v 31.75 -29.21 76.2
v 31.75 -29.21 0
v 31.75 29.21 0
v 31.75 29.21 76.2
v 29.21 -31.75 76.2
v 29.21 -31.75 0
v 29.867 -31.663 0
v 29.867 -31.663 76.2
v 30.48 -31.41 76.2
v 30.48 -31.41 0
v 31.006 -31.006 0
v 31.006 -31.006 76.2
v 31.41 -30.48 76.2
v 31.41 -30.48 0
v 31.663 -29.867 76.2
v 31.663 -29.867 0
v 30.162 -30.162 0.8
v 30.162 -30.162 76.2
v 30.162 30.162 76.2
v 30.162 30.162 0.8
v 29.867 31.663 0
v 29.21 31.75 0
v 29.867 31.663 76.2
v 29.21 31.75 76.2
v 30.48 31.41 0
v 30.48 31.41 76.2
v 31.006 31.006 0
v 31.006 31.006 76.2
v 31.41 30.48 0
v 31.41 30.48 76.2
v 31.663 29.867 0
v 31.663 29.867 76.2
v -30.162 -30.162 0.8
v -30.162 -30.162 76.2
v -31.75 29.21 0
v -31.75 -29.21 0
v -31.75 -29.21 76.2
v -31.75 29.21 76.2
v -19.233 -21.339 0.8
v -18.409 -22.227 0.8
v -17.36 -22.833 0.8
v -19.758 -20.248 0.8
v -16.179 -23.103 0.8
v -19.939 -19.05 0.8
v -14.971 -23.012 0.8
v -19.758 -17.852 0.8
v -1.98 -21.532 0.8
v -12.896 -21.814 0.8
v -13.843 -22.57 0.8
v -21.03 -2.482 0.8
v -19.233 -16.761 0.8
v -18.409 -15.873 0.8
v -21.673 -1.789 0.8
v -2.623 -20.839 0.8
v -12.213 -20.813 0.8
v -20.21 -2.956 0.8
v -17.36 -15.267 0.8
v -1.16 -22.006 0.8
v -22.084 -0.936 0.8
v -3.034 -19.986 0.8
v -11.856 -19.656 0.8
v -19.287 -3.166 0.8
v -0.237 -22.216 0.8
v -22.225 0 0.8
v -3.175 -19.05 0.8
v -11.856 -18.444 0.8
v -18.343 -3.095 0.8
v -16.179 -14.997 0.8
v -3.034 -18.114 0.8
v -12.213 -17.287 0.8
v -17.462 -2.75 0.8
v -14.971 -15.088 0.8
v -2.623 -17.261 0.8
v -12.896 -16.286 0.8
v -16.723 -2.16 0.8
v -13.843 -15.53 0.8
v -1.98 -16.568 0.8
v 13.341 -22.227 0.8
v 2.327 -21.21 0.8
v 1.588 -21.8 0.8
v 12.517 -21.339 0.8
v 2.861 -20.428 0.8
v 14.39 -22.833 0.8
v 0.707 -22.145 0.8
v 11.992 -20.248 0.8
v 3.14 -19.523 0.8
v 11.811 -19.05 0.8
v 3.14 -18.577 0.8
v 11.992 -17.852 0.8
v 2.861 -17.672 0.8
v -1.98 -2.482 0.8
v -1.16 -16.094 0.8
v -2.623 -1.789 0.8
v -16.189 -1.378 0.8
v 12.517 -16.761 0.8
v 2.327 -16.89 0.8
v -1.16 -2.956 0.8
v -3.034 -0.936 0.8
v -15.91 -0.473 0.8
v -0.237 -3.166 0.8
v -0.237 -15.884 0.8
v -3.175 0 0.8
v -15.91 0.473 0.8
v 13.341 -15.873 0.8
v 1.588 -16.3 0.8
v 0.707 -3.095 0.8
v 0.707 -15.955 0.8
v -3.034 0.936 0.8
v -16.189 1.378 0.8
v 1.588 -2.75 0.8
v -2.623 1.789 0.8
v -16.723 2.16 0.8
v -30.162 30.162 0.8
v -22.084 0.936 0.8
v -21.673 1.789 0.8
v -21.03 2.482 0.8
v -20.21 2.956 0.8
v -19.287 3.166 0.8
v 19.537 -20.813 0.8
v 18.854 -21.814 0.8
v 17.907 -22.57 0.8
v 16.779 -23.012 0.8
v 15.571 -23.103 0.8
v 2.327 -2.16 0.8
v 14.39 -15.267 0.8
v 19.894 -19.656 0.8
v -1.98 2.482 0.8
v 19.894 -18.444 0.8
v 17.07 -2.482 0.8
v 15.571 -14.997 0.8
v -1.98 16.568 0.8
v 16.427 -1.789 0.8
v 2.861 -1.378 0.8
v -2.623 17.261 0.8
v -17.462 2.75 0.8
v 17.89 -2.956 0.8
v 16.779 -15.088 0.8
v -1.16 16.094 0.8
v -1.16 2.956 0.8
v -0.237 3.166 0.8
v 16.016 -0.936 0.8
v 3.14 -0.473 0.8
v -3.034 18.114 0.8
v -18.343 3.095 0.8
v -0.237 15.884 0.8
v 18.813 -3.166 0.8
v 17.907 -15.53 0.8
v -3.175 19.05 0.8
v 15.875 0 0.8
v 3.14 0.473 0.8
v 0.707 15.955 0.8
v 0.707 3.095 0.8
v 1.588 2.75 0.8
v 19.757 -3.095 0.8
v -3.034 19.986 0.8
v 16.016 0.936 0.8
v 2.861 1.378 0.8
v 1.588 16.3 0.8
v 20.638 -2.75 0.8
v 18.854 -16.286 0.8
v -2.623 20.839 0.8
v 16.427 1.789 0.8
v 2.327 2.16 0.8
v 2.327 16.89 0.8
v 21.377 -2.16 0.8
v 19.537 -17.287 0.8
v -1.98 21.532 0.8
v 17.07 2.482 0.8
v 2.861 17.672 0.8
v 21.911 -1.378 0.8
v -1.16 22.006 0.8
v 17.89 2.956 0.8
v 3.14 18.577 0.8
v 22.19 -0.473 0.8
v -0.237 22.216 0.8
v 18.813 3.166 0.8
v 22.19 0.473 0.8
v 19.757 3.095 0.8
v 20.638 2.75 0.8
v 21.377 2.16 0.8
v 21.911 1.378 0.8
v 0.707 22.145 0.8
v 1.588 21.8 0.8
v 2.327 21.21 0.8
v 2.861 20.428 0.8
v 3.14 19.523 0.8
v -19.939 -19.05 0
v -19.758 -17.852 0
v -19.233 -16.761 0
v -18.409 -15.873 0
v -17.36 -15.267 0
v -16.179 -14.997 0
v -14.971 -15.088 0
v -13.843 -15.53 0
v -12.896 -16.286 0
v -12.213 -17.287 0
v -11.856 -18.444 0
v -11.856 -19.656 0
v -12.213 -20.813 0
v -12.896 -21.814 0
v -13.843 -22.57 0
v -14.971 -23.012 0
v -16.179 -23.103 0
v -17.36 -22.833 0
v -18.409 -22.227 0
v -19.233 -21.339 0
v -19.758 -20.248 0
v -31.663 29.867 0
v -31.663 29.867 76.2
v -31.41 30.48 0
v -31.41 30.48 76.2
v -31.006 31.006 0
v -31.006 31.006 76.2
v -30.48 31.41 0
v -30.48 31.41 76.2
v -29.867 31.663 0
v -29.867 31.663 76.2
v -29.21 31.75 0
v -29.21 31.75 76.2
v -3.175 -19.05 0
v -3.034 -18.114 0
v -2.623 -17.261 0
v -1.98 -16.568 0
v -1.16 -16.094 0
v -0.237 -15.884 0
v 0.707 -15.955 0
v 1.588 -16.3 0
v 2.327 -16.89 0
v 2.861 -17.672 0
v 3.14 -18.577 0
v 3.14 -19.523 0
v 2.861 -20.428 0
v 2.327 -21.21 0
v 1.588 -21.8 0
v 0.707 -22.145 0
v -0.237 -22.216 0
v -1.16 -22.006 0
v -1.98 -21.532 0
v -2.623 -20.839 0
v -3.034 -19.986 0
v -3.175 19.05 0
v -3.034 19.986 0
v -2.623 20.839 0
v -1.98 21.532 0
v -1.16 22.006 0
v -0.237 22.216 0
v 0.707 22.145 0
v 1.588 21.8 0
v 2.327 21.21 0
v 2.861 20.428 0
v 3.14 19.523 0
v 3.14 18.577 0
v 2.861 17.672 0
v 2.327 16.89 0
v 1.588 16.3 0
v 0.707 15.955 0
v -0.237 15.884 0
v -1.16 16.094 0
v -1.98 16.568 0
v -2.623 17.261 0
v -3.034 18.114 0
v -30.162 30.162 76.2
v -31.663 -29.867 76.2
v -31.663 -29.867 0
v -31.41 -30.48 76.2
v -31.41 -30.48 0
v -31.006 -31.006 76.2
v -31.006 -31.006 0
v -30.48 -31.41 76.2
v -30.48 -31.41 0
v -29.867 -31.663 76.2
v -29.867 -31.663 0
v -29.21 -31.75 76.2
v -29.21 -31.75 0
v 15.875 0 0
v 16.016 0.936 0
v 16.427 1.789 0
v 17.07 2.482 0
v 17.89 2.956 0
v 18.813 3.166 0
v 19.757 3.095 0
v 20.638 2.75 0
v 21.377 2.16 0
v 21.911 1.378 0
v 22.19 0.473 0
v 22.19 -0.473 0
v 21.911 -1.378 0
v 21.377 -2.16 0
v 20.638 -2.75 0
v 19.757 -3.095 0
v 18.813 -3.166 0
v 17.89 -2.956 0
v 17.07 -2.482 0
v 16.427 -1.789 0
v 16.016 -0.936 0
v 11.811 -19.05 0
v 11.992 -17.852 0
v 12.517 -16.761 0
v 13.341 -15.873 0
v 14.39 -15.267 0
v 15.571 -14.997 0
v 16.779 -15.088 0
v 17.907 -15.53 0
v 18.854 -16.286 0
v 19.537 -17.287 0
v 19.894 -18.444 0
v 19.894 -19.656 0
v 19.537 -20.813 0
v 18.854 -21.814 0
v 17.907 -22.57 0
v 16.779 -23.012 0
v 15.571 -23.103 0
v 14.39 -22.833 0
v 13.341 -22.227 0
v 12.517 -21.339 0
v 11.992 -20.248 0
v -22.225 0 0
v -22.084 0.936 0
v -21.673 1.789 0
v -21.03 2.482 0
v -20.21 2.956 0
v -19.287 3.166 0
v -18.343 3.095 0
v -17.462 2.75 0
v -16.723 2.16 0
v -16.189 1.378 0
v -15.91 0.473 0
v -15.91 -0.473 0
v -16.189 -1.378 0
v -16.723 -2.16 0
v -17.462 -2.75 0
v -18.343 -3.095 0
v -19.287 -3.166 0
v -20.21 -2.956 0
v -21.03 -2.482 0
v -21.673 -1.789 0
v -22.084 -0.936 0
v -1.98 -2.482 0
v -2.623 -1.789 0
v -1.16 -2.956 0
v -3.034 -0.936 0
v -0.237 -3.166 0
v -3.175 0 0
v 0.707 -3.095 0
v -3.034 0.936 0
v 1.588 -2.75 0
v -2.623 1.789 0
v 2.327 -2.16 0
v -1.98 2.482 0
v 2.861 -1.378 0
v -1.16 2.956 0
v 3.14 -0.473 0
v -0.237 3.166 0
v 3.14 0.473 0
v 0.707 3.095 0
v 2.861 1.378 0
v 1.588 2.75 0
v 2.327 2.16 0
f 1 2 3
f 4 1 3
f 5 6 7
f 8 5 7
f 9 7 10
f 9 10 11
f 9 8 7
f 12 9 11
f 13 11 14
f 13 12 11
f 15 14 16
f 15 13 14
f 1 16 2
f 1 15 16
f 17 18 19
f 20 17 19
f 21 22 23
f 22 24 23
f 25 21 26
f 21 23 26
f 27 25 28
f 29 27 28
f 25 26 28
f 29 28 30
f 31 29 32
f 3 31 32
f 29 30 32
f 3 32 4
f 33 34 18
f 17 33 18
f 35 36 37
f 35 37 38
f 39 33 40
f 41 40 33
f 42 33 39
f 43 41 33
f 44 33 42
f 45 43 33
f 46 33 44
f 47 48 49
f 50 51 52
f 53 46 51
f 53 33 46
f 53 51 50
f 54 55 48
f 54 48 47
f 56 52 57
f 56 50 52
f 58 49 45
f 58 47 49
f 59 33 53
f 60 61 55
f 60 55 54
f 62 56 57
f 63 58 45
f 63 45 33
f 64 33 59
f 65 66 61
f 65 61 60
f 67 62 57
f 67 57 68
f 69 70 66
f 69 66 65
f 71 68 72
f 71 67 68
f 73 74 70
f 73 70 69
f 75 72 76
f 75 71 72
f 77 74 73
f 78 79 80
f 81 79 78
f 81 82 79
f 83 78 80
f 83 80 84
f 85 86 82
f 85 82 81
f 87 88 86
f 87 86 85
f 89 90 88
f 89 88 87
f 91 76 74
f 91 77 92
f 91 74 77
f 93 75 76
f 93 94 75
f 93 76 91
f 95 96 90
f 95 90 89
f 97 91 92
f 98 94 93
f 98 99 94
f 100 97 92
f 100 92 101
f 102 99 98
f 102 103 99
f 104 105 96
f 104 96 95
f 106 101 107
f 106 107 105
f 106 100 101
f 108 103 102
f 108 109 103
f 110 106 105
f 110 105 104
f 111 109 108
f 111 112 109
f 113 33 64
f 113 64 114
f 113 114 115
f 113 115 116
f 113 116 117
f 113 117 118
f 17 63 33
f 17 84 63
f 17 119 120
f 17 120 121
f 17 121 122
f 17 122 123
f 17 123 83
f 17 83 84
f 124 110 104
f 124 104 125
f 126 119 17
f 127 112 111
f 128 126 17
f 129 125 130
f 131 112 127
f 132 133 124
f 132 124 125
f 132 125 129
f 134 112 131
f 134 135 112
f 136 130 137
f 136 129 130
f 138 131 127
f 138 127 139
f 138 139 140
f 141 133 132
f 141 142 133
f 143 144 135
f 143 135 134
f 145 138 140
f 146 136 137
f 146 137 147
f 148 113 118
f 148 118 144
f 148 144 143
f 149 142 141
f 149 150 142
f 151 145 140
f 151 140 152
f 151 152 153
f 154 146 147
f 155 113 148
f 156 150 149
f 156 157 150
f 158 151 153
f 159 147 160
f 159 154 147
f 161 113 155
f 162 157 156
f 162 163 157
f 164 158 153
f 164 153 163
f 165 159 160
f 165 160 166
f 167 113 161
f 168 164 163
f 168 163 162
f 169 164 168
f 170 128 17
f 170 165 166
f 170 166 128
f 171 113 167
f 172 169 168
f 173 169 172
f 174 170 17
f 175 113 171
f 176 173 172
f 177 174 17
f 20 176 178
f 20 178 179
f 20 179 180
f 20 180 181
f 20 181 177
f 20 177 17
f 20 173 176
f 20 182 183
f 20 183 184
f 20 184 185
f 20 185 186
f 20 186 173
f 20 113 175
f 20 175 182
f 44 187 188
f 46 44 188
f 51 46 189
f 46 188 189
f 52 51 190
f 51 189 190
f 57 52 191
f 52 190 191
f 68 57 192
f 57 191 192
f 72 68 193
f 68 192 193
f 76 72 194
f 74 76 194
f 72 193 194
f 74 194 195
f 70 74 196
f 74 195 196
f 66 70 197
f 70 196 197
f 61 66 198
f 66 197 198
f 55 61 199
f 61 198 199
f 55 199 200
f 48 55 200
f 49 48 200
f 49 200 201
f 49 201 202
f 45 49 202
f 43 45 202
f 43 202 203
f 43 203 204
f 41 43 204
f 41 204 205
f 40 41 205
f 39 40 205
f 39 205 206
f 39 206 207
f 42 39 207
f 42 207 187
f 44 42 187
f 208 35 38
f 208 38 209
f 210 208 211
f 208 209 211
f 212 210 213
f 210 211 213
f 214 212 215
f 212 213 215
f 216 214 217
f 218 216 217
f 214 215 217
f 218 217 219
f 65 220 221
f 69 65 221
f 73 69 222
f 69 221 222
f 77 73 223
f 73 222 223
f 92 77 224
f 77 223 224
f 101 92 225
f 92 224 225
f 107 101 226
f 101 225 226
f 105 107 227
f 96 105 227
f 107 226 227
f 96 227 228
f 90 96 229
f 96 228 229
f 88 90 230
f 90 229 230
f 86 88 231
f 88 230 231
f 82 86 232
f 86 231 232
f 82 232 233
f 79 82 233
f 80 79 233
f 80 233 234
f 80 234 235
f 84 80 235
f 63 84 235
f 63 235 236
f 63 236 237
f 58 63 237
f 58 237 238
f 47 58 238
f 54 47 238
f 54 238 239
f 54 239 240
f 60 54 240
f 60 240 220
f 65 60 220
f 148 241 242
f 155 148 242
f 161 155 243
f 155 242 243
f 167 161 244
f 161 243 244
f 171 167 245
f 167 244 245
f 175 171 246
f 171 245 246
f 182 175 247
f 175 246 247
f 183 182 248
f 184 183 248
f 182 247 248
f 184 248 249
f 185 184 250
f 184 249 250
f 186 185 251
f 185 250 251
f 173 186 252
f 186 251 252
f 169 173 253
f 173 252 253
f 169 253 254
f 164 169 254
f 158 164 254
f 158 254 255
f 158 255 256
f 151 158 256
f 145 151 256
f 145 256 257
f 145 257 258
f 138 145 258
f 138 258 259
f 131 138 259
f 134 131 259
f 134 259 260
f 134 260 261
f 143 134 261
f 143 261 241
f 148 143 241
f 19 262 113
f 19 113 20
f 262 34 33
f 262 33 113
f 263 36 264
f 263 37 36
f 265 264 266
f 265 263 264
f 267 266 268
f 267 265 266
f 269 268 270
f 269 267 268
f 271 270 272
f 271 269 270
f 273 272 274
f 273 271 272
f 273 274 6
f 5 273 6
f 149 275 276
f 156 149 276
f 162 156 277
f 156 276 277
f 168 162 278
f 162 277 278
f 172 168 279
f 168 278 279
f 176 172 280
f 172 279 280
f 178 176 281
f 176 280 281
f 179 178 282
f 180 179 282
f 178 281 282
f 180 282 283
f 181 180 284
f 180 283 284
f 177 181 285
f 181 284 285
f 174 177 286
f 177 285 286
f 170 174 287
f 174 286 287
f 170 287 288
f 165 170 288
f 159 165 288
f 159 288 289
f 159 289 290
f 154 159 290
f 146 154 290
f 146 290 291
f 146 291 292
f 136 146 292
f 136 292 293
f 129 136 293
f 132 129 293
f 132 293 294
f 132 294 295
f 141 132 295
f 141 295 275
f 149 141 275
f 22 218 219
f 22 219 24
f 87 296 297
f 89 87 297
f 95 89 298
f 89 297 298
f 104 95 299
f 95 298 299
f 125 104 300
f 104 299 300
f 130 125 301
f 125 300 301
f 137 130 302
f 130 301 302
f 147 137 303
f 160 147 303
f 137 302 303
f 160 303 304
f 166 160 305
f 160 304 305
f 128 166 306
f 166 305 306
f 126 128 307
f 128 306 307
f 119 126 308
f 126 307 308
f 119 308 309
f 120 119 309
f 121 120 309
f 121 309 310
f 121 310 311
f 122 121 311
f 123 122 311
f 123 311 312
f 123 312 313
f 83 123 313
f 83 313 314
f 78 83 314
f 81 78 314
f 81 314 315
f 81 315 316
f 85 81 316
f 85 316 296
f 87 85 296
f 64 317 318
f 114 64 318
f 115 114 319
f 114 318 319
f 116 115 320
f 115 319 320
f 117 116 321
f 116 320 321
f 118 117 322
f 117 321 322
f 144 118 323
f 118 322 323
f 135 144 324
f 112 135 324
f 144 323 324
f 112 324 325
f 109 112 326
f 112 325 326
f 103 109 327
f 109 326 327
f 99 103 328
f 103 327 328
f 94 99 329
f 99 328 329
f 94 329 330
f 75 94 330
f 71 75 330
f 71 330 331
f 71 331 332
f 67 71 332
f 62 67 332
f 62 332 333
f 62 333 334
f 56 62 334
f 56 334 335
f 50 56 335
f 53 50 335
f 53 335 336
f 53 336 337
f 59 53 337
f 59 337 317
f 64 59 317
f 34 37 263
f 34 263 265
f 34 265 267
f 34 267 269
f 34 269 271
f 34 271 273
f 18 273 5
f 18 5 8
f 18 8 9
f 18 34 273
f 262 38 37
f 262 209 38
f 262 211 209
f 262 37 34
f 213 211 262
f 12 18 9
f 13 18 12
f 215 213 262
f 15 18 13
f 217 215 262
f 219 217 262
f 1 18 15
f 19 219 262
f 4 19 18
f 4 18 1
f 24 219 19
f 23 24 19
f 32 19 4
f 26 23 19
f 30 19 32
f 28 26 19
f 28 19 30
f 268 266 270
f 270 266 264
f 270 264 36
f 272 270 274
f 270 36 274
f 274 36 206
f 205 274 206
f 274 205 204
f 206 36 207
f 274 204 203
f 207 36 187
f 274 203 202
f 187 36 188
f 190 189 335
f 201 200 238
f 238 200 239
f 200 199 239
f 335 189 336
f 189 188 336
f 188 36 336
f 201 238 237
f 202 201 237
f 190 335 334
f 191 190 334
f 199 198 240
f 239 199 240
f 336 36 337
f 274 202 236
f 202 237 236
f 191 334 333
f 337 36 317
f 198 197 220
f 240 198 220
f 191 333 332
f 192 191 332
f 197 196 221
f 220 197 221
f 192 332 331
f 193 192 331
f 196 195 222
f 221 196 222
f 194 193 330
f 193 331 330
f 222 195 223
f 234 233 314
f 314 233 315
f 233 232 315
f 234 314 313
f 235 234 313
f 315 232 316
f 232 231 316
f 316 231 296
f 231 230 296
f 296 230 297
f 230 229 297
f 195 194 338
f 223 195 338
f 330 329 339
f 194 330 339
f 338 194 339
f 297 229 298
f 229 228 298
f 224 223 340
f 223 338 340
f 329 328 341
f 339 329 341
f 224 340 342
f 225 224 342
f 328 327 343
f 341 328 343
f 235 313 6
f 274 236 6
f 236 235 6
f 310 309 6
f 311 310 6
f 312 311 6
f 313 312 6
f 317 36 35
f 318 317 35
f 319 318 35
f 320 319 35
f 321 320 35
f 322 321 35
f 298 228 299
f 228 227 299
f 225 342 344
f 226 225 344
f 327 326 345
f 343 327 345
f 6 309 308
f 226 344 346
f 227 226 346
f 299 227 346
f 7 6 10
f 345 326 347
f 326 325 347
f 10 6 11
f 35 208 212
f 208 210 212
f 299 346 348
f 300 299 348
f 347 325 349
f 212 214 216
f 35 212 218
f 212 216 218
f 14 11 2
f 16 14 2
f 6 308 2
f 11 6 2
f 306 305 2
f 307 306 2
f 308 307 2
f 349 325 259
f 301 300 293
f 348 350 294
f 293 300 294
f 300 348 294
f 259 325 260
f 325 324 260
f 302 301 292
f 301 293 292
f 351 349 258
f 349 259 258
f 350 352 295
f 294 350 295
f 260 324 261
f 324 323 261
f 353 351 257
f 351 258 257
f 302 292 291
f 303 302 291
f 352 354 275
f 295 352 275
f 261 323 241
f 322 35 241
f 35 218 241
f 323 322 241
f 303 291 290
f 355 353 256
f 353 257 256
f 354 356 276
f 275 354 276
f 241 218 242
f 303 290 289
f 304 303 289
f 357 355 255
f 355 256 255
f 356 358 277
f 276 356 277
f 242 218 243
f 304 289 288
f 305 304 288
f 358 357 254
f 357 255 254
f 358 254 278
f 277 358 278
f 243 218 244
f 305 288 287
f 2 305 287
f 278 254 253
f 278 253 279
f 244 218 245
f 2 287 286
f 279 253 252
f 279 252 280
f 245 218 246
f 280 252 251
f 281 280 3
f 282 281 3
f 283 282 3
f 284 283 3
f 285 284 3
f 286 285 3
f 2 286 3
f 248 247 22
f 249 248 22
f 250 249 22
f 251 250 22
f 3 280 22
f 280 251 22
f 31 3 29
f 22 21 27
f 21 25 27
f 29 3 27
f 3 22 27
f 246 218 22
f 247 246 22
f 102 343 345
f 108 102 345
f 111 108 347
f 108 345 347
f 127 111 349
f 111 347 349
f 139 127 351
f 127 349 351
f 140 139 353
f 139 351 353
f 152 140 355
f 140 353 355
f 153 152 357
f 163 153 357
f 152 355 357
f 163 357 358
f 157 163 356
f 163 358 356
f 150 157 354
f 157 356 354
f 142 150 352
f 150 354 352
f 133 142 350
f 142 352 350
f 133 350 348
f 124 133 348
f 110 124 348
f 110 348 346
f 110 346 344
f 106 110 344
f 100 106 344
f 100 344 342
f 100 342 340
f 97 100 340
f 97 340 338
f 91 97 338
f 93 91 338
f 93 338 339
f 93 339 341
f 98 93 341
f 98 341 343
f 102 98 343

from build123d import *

# Parameters (mm, degrees)
SKETCH1_W           = 63.5
SKETCH1_H           = 63.5
BOSS_EXTRUDE1_DEPTH = 76.2
SKETCH2_W           = 60.325
SKETCH2_H           = 60.325
CUT_EXTRUDE1_DEPTH  = 75.4
FILLET1_R           = 2.54
SKETCH3_R           = 3.175
CUT_EXTRUDE2_DEPTH  = 89.44526556
SKETCH4_R           = 4.064
CUT_EXTRUDE3_DEPTH  = 89.44526556


with BuildPart() as part:
    # Sketch1 → Boss-Extrude1 (new body)
    with BuildSketch(Plane.XY):
        Rectangle(SKETCH1_W, SKETCH1_H)
    extrude(amount=BOSS_EXTRUDE1_DEPTH)

    # Sketch2 → Cut-Extrude1 (cut)
    with BuildSketch(Plane.XY.offset(76.2)):
        Rectangle(SKETCH2_W, SKETCH2_H)
    extrude(amount=-CUT_EXTRUDE1_DEPTH, mode=Mode.SUBTRACT)

    # Fillet1
    fillet1_edges = [part.edges().sort_by_distance(p)[0] for p in [
        (31.75, -31.75, 38.1),
        (-31.75, -31.75, 38.1),
        (-31.75, 31.75, 38.1),
        (31.75, 31.75, 38.1),
    ]]
    fillet(fillet1_edges, radius=FILLET1_R)

    # Sketch3 → Cut-Extrude2 (cut, through all)
    with BuildSketch(Plane(origin=(0, 0, 0), x_dir=(-1, 0, 0), z_dir=(0, 0, -1))):
        with Locations((0, 19.05)):
            Circle(SKETCH3_R)
        with Locations((0, -19.05)):
            Circle(SKETCH3_R)
        Circle(SKETCH3_R)
        with Locations((19.05, 0)):
            Circle(SKETCH3_R)
        with Locations((-19.05, 0)):
            Circle(SKETCH3_R)
    extrude(amount=-CUT_EXTRUDE2_DEPTH, mode=Mode.SUBTRACT)

    # Sketch4 → Cut-Extrude3 (cut, through all)
    with BuildSketch(Plane(origin=(0, 0, 0), x_dir=(-1, 0, 0), z_dir=(0, 0, -1))):
        with Locations((-15.875, -19.05)):
            Circle(SKETCH4_R)
        with Locations((15.875, -19.05)):
            Circle(SKETCH4_R)
    extrude(amount=-CUT_EXTRUDE3_DEPTH, mode=Mode.SUBTRACT)


solid = part.part
